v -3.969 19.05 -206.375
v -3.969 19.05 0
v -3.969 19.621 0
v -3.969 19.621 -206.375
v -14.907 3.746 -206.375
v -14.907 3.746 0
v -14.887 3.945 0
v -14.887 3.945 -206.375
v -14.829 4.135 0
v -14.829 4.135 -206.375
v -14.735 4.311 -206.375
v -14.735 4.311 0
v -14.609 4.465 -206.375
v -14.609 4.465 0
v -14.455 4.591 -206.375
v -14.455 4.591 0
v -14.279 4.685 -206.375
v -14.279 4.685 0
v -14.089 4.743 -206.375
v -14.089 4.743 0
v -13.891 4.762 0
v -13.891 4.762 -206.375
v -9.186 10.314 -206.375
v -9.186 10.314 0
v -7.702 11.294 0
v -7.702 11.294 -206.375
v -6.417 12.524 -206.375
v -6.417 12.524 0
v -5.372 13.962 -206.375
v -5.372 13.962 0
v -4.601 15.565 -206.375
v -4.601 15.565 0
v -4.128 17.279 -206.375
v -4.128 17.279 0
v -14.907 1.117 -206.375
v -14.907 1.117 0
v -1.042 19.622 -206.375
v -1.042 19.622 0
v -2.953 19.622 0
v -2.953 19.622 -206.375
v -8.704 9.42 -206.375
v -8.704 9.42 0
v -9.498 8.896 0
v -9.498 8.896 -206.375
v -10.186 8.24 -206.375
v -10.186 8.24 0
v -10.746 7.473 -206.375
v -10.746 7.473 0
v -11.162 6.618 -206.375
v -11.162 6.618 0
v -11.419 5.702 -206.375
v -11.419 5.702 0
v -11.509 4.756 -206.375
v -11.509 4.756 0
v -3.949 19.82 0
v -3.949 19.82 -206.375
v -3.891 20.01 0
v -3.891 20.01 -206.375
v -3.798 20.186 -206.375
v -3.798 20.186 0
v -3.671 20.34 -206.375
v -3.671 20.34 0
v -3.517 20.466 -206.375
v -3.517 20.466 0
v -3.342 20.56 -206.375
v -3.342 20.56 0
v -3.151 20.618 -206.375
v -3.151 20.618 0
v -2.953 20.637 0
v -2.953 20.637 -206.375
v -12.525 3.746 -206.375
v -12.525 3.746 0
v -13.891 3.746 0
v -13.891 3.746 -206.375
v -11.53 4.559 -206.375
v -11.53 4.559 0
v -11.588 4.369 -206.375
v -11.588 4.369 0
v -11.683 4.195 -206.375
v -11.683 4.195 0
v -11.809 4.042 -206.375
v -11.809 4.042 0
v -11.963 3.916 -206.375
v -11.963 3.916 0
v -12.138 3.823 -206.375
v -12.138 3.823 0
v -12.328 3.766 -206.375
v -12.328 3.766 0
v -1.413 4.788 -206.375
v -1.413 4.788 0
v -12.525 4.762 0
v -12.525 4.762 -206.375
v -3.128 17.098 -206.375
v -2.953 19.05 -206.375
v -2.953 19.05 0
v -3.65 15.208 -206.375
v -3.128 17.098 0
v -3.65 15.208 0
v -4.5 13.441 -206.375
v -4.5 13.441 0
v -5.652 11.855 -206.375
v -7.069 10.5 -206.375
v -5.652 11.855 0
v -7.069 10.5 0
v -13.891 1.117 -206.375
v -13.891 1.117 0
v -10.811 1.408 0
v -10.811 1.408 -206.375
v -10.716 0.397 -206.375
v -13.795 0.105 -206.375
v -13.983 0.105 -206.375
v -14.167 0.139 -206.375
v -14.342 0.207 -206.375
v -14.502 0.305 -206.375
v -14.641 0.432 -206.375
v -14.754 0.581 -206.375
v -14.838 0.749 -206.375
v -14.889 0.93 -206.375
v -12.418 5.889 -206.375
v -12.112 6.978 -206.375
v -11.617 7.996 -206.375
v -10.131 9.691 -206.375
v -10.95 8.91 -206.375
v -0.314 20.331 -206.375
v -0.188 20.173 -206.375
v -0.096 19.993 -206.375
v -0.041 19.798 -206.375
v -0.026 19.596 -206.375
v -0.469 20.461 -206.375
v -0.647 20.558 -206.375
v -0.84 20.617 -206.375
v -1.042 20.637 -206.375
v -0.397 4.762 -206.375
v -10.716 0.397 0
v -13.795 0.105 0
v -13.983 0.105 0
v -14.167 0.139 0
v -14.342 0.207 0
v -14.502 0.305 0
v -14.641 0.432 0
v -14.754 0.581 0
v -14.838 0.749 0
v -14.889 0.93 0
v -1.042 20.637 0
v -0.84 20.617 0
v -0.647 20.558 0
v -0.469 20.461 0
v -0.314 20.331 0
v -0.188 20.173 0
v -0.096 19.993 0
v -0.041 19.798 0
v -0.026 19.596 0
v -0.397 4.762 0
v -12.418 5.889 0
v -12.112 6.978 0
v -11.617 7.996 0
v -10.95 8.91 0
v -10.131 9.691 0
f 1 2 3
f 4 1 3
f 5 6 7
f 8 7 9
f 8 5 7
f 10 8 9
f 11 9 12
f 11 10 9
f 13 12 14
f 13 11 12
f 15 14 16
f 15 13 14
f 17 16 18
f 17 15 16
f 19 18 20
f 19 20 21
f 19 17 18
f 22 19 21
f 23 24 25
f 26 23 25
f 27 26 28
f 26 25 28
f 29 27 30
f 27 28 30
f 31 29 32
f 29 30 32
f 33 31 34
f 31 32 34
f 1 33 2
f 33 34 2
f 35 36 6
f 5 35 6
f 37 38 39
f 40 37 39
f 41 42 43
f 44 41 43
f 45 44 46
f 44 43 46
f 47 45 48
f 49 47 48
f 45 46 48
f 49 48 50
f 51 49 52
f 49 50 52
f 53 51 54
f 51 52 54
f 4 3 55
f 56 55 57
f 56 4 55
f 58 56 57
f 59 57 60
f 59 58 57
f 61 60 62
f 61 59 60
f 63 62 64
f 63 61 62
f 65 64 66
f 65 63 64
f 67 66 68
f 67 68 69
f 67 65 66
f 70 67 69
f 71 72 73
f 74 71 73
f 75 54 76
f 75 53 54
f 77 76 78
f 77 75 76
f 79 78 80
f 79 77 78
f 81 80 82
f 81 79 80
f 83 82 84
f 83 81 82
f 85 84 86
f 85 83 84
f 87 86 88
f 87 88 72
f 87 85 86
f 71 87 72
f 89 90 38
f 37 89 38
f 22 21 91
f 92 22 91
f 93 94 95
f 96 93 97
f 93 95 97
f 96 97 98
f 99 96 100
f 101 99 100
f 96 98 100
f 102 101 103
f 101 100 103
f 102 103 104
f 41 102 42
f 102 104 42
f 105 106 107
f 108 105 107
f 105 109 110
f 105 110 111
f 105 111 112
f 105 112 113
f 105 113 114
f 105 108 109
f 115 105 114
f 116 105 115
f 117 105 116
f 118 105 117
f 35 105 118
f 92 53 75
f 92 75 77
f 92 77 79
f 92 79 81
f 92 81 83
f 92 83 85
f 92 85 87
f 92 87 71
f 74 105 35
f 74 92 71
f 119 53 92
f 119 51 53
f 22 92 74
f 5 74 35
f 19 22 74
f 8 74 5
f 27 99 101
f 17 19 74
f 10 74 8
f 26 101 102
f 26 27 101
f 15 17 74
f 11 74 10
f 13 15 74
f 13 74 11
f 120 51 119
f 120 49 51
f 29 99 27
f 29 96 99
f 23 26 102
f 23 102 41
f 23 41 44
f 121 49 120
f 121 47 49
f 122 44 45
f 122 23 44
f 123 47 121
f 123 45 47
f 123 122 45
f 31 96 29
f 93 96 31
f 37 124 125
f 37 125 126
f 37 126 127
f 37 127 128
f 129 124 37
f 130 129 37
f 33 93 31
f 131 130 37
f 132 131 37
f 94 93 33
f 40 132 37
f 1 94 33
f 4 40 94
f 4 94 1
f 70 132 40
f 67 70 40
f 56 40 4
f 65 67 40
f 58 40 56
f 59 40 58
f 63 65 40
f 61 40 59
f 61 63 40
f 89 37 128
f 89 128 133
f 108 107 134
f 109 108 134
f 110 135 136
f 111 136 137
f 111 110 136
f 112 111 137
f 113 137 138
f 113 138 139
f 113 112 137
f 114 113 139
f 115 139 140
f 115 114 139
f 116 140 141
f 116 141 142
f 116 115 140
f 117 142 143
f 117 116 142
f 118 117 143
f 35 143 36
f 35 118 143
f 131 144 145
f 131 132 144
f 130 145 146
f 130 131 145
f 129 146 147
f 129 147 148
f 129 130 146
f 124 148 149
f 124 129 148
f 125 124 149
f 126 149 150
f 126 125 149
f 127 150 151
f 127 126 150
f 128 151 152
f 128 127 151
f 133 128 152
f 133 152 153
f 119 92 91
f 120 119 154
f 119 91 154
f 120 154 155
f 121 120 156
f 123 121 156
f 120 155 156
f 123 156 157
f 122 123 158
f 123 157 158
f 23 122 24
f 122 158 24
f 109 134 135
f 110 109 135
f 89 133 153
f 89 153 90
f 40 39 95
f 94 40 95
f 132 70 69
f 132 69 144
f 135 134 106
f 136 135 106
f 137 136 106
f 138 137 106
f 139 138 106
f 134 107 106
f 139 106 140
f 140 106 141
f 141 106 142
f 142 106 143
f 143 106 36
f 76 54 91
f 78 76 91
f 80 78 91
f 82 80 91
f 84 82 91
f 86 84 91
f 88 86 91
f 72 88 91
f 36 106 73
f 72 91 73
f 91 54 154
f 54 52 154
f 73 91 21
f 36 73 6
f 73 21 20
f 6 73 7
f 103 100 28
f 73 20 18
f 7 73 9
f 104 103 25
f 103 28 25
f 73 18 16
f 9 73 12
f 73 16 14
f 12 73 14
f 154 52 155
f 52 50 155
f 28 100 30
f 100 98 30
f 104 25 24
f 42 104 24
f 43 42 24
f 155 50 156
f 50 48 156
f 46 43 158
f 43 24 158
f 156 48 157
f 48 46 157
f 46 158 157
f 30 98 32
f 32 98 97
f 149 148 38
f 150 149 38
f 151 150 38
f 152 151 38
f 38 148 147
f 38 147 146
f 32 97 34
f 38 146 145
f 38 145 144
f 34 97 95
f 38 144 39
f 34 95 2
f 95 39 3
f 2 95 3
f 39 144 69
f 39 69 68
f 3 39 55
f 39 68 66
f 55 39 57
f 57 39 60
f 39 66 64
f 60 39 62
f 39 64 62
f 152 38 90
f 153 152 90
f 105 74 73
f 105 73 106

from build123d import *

# Parameters (mm, degrees)
EXTRUDE_THIN1_DEPTH = 206.375
FILLET1_R           = 1.016


with BuildPart() as part:
    # Sketch2 → Extrude-Thin1 (new body)
    with BuildSketch(Plane.XY):
        with BuildLine():
            Line((-10.715625, 0.396875), (-14.906625, 0))
            Line((-14.906625, 0), (-14.906625, 4.7625))
            Line((-14.906625, 4.7625), (-12.525255186, 4.7625))
            ThreePointArc((-12.525255186, 4.7625), (-11.617011589, 7.996272283), (-9.186204268, 10.314324348))
            ThreePointArc((-9.186204268, 10.314324348), (-5.372401066, 13.962420562), (-3.96875, 19.05))
            Line((-3.96875, 19.05), (-3.96875, 20.6375))
            Line((-3.96875, 20.6375), (0, 20.6375))
            Line((0, 20.6375), (-0.396875, 4.7625))
            Line((-0.396875, 4.7625), (-1.412557649, 4.787892066))
            Line((-1.412557649, 4.787892066), (-1.04171745, 19.6215))
            Line((-1.04171745, 19.6215), (-2.95275, 19.6215))
            Line((-2.95275, 19.6215), (-2.95275, 19.05))
            ThreePointArc((-2.95275, 19.05), (-4.500134936, 13.441452428), (-8.704471585, 9.419791161))
            ThreePointArc((-8.704471585, 9.419791161), (-10.986912369, 7.025809056), (-11.419137272, 3.7465))
            Line((-11.419137272, 3.7465), (-13.890625, 3.7465))
            Line((-13.890625, 3.7465), (-13.890625, 1.116757452))
            Line((-13.890625, 1.116757452), (-10.811408609, 1.408349913))
            Line((-10.811408609, 1.408349913), (-10.715625, 0.396875))
        make_face()
    extrude(amount=-EXTRUDE_THIN1_DEPTH)

    # Fillet1
    fillet1_edges = [part.edges().sort_by_distance(p)[0] for p in [
        (-11.419137272, 3.7465, -103.1875),
        (-14.906625, 0, -103.1875),
        (-14.906625, 4.7625, -103.1875),
        (-3.96875, 20.6375, -103.1875),
        (0, 20.6375, -103.1875),
    ]]
    fillet(fillet1_edges, radius=FILLET1_R)


solid = part.part
